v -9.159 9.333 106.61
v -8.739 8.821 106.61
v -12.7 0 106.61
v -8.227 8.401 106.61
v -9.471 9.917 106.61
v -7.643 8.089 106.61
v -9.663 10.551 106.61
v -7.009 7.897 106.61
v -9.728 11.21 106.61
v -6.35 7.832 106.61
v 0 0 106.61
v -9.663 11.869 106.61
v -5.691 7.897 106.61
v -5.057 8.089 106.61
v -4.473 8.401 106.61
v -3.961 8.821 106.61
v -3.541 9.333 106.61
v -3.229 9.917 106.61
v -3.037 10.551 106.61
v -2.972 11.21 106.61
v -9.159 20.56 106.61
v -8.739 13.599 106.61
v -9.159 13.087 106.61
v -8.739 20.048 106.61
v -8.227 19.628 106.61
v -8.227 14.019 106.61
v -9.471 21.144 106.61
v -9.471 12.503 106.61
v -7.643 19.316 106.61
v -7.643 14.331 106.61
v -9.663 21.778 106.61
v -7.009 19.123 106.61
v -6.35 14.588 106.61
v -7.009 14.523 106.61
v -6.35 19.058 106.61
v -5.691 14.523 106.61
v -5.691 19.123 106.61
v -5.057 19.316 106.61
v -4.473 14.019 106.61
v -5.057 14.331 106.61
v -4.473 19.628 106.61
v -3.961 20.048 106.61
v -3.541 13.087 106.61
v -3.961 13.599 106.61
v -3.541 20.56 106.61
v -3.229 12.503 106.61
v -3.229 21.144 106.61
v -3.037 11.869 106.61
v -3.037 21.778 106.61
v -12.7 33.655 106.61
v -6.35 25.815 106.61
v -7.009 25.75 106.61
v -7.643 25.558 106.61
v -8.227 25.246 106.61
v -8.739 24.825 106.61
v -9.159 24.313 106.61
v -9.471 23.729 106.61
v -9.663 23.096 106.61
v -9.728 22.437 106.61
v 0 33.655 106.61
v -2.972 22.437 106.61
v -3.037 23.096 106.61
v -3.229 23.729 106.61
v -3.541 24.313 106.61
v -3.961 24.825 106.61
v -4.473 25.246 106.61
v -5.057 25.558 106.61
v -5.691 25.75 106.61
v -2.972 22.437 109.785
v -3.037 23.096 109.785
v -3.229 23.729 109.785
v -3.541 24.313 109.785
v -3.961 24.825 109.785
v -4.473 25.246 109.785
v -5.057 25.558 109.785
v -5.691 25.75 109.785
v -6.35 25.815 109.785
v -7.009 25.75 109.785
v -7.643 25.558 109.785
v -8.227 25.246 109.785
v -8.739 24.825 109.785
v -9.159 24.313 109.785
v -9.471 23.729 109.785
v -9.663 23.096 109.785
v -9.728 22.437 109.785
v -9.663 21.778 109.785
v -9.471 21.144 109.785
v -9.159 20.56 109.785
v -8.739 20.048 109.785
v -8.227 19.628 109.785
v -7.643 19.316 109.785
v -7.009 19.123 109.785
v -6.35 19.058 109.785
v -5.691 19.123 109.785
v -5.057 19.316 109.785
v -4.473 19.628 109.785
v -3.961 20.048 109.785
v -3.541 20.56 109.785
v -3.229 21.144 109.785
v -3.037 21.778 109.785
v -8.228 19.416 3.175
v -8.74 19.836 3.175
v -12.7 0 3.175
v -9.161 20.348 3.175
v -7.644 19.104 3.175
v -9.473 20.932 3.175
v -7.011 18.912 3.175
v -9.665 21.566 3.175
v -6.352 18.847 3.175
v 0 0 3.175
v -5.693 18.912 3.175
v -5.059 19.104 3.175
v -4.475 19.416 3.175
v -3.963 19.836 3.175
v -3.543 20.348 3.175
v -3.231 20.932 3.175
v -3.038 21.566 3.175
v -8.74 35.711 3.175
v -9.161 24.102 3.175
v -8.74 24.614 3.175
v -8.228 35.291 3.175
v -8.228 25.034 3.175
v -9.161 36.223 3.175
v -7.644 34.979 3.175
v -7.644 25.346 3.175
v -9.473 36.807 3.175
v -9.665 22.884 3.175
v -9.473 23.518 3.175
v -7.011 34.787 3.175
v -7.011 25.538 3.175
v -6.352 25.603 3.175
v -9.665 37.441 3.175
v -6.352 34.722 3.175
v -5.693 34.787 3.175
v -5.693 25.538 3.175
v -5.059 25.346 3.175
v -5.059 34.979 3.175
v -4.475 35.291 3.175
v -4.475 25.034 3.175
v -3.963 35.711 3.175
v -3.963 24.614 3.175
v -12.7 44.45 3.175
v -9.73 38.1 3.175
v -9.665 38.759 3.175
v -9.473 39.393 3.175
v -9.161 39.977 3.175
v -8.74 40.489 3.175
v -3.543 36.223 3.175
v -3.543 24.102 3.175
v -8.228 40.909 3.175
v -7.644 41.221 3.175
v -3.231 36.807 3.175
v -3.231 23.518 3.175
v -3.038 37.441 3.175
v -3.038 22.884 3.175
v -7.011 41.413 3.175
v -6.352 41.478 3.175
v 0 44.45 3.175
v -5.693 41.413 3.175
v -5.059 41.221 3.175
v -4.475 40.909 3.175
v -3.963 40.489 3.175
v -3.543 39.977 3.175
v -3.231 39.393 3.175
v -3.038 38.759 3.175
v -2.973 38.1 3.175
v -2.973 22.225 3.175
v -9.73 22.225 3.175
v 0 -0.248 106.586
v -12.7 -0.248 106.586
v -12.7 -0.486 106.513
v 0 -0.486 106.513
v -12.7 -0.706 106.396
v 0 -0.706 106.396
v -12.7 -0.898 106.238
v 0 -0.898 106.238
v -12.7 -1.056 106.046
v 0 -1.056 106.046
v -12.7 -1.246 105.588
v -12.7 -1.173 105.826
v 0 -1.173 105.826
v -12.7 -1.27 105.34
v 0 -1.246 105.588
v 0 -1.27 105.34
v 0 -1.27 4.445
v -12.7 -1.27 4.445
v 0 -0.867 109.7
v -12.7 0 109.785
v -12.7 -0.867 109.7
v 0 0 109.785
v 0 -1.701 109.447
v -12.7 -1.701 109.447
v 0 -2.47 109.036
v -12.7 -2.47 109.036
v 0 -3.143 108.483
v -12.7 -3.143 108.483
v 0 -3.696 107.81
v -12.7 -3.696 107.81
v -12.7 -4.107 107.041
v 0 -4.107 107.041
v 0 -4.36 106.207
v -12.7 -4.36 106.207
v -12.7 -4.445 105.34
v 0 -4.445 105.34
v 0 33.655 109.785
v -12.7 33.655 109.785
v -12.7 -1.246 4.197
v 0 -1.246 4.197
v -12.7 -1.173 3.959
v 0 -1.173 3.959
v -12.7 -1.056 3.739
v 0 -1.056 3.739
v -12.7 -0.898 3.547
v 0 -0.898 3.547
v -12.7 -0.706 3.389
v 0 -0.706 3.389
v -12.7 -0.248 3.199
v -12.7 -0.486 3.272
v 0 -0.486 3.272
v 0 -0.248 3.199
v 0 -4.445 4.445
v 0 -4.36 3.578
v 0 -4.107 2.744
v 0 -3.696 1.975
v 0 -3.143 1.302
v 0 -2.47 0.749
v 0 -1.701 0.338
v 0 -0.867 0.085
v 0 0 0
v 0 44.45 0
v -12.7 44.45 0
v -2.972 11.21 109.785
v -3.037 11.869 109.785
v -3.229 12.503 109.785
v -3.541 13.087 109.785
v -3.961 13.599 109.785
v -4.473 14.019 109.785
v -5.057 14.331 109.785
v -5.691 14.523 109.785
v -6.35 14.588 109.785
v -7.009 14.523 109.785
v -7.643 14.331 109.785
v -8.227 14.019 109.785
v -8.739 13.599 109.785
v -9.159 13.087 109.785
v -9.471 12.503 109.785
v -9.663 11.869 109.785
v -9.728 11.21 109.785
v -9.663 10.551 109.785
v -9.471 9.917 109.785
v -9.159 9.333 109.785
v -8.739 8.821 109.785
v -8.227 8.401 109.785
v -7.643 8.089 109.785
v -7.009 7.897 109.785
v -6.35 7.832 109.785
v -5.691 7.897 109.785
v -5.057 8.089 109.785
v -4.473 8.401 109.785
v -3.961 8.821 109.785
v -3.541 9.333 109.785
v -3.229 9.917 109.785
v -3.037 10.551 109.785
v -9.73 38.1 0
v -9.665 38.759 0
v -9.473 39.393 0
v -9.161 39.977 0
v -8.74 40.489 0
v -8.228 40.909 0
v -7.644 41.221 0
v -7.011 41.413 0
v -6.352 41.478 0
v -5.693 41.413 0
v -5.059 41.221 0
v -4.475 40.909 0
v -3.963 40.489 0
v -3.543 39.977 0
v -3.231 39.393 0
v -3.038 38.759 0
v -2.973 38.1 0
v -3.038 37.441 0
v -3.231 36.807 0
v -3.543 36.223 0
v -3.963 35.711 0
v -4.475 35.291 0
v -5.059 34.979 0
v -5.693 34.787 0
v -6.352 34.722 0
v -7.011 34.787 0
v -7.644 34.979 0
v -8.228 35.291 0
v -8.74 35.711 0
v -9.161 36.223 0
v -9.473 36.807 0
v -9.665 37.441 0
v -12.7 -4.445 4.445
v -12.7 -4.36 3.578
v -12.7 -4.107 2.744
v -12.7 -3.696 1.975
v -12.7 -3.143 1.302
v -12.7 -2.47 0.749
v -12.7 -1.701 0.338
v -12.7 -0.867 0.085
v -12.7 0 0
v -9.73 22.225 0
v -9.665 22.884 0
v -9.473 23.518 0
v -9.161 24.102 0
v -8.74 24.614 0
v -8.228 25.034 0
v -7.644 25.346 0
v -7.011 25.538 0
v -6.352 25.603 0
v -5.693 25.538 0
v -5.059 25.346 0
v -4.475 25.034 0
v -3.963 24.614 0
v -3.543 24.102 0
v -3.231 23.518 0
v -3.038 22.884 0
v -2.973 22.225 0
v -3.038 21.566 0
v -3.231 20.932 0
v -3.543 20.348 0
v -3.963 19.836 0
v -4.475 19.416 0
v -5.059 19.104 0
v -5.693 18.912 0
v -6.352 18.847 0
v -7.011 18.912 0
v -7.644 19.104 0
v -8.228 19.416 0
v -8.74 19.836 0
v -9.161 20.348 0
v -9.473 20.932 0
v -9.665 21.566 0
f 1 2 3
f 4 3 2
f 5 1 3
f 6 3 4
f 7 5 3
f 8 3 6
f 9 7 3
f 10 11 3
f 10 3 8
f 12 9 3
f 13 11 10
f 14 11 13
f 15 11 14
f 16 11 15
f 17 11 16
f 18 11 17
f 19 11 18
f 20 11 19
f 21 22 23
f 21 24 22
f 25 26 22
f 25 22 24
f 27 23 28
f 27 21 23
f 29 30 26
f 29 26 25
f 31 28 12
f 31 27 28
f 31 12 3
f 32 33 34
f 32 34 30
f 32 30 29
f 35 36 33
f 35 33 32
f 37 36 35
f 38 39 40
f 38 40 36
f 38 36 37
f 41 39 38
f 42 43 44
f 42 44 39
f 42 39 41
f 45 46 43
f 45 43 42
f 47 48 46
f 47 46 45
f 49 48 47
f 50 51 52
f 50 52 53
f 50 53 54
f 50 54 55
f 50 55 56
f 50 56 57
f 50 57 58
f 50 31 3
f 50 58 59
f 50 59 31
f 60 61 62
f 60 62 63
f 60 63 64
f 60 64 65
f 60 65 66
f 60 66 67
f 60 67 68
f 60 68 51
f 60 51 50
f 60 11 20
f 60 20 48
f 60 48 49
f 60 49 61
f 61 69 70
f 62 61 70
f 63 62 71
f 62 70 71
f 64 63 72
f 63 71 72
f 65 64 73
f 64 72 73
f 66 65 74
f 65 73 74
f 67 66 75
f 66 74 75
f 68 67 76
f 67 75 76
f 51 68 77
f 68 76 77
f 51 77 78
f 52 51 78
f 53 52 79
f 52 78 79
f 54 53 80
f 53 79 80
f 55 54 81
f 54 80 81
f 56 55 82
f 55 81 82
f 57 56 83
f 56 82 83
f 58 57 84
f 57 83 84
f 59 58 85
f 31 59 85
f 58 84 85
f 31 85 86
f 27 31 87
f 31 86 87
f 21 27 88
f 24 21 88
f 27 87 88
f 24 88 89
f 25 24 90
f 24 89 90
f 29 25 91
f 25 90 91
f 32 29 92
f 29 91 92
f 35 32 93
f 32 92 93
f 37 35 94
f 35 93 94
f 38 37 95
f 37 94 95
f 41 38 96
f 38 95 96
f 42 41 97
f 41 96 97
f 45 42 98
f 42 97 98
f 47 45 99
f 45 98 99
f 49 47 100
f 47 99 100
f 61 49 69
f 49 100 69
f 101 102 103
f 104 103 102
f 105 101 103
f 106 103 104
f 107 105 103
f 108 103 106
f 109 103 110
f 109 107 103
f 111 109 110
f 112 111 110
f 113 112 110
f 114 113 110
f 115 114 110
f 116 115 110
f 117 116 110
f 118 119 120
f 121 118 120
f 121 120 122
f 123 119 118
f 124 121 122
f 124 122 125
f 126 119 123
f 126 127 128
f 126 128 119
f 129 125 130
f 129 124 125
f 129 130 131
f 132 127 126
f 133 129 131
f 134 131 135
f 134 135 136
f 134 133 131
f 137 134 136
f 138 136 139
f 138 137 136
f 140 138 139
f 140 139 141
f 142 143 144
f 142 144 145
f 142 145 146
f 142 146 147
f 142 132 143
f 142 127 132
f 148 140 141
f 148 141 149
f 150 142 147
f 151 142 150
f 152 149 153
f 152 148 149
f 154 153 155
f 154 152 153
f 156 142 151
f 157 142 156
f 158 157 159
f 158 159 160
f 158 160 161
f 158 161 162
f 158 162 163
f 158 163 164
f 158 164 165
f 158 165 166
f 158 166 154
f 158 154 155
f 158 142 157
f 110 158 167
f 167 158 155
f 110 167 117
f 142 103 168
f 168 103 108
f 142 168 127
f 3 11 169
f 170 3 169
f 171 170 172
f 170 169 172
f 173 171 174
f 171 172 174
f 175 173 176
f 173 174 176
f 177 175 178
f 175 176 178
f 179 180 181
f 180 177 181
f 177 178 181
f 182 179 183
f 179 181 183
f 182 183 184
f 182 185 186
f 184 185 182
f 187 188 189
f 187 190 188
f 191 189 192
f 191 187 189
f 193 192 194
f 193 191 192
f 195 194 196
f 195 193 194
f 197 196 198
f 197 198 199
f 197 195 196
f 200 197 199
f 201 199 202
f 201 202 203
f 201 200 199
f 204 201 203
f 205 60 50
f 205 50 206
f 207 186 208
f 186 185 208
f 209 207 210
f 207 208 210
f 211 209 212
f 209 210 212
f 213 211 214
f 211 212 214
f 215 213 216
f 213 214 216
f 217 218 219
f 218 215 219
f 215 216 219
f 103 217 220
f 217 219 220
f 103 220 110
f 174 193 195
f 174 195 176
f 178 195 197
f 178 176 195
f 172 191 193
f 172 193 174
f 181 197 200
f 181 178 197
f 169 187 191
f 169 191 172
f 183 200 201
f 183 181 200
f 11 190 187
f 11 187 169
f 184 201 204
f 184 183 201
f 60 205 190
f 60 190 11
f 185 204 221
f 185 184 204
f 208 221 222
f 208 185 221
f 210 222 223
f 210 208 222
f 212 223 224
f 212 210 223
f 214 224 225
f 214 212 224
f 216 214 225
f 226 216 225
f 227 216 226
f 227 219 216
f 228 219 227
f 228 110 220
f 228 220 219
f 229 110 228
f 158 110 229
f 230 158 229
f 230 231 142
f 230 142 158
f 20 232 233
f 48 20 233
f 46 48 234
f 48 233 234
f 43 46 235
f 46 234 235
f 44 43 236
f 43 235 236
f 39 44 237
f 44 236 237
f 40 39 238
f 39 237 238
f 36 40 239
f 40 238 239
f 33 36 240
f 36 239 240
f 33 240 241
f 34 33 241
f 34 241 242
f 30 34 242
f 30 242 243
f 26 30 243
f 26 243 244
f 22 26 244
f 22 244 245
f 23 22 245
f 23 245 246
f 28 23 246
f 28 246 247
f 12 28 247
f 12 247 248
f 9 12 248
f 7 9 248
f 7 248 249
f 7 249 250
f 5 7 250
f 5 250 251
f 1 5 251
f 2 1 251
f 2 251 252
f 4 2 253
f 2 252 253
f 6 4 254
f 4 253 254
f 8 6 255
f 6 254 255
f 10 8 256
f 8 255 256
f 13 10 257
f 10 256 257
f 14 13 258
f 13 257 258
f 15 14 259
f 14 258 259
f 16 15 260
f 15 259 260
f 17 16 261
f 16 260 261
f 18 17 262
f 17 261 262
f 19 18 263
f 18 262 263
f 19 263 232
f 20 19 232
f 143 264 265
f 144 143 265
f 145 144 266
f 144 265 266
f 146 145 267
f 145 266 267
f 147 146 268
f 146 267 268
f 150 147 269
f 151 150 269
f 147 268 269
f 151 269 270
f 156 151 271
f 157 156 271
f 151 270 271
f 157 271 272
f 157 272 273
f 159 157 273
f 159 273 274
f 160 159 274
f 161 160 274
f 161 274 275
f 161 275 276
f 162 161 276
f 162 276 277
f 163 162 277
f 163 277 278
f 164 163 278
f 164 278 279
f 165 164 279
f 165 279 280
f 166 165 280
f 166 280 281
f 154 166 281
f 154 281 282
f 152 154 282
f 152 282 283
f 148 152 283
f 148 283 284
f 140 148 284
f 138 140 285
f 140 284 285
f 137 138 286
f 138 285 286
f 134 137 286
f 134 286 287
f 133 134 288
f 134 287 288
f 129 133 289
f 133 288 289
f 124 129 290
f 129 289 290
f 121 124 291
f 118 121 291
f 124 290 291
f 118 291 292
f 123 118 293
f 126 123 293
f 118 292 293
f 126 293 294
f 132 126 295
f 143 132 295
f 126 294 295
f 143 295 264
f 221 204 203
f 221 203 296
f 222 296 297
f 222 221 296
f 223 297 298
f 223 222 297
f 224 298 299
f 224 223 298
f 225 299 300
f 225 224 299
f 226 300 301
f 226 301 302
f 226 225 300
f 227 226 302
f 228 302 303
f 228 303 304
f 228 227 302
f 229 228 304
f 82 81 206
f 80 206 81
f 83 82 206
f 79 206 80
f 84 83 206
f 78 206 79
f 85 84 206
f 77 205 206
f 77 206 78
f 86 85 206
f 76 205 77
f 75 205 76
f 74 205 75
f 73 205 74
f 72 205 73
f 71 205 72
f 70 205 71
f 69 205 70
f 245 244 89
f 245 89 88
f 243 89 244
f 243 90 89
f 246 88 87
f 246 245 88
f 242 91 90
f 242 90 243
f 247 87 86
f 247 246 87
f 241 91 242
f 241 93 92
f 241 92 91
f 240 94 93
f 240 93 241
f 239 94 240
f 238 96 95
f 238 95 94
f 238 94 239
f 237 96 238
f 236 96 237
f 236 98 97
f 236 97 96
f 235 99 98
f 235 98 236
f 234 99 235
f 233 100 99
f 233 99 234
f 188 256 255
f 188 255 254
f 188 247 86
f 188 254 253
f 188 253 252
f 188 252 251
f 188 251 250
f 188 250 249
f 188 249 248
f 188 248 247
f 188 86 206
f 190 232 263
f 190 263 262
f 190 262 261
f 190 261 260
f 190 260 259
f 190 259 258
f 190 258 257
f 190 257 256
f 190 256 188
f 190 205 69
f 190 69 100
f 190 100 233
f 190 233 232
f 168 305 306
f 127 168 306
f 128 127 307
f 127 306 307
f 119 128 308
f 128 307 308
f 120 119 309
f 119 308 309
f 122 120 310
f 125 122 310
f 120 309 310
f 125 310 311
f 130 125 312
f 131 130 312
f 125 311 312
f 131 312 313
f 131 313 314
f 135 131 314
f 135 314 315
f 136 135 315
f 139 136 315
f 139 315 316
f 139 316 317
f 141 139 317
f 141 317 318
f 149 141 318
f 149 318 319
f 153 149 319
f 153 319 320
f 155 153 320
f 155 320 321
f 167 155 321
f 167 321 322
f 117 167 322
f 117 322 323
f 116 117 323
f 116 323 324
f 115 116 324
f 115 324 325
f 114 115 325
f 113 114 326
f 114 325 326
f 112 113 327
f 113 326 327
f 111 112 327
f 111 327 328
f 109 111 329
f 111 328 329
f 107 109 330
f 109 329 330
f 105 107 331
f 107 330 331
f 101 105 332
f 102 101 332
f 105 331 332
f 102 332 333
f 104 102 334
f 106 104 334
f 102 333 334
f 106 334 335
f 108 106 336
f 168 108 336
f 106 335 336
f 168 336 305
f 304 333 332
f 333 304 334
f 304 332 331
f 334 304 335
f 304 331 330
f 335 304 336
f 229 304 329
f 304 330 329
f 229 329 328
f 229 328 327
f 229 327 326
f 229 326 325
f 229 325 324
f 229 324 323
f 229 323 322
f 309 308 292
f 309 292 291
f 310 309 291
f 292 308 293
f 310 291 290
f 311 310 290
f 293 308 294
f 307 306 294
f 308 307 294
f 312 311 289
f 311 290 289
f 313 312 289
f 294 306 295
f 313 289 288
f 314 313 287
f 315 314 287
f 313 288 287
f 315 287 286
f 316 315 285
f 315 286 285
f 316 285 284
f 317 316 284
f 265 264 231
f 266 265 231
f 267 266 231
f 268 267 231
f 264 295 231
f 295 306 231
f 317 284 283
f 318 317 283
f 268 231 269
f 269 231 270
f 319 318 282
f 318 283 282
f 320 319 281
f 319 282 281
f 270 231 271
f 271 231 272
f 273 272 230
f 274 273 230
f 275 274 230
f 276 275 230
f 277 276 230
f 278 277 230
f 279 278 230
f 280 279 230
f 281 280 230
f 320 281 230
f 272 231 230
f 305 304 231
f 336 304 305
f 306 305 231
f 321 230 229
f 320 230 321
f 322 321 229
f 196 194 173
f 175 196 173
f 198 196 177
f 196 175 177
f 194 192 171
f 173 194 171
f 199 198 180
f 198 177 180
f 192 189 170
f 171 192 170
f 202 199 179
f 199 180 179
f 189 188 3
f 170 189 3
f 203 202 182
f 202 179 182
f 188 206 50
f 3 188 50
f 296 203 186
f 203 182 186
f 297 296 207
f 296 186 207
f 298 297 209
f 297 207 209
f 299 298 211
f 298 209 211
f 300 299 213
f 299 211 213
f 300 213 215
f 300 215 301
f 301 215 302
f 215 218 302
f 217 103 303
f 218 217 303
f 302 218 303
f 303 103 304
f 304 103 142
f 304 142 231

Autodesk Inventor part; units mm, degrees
ref_plane "YZ Plane" through (0, 0, 0) normal (1, 0, 0) x (0, 1, 0)
ref_plane "XZ Plane" through (0, 0, 0) normal (0, 1, 0) x (-1, 0, 0)
ref_plane "XY Plane" through (0, 0, 0) normal (0, 0, 1) x (1, 0, 0)
sketch "Sketch1" plane through (0, 0, 0) normal (0, 0, 1) x (1, 0, 0)
  line L0 (0, 0) -> (187.378778, 0)
  line L1 (187.378778, -12.7) -> (0, -12.7)
  line L2 (0, 0) -> (35.7378, 0)
  line L3 (35.7378, 0) -> (35.7378, -1.5875)
  line L4 (35.7378, -1.5875) -> (36.53155, -1.5875)
  line L5 (36.53155, -1.5875) -> (36.53155, 0)
  line L6 (35.7378, -1.5875) -> (34.94405, -1.5875)
  line L7 (34.94405, -1.5875) -> (34.94405, 0)
  line L8 (36.53155, -12.7) -> (34.94405, -12.7)
  line L9 (34.94405, -12.7) -> (34.94405, -11.1125)
  line L10 (34.94405, -11.1125) -> (36.53155, -11.1125)
  line L11 (36.53155, -11.1125) -> (36.53155, -12.7)
  line L12 (187.378778, 0) -> (151.640978, 0)
sketch "Sketch3" plane through (0, 0, 0) normal (0, 0, -1) x (-1, 0, 0)
  circle A0 centre (6.35164, 38.1) radius 3.3782
  circle A1 centre (6.35164, 22.225) radius 3.3782
sketch "Sketch6" plane through (-12.7, 33.655, 109.78515) normal (0, 0, 1) x (1, 0, 0)
  line L0 (0, 0) -> (12.7, 0)
  line L1 (0, -33.655) -> (0, 0)
  line L2 (6.35, 0) -> (6.35, -11.218333)
  line L3 (6.35, -11.218333) -> (6.35, -22.445133)
  circle A0 centre (6.35, -11.218333) radius 3.3782
  circle A1 centre (6.35, -22.445133) radius 3.3782
  dimension "d29" = 11.21833
  dimension "d31" = 11.2268
  dimension "d32" = 6.7564
  dimension "d33" = 6.7564
sketch "Sketch1 outline for Plate1" plane through (0, 0, 0) normal (0, 0, 1) x (1, 0, 0)
  line L0 (0, 0) -> (-12.7, 0)
  line L1 (-12.7, 0) -> (-12.7, 44.45)
  line L2 (-12.7, 44.45) -> (0, 44.45)
  line L3 (0, 44.45) -> (0, 0)
extrude "Plate1" add sketch "Sketch1 outline for Plate1" along normal blind 3.175
sketch "Sketch2" plane through (0, -12.7, 0) normal (0, 0, 1) x (1, 0, 0)
  line L0 (35.7378, 11.1125) -> (35.7378, 12.7)
  line L1 (0, 12.7) -> (35.7378, 12.7)
  line L2 (36.53155, 12.7) -> (187.378778, 12.7)
  line L3 (35.7378, 11.1125) -> (34.94405, 11.1125)
  line L4 (34.94405, 11.1125) -> (34.94405, 12.7)
edge flange "Flange1" height 105.34015 angle 90 thickness 3.175 bend radius 1.27 thickness toward (0, -1, 0) relief straight relief width 3.175 relief depth 1.5875 edges at (-6.35, 0, 3.175) wall of the first edge with corners at (-12.7, -1.27, 4.445) (0, -1.27, 4.445) (0, -1.27, 105.34015) (-12.7, -1.27, 105.34015)
bend "Bend1"
corner "Corner1"
sketch "Sketch4" plane through (0, -12.7, 0) normal (0, 0, 1) x (1, 0, 0)
  line L0 (187.378778, 0) -> (36.53155, 0)
  line L1 (36.53155, 12.7) -> (187.378778, 12.7)
  line L2 (187.378778, 12.7) -> (140.845978, 12.7)
  line L3 (140.845978, 12.7) -> (140.845978, 11.1125)
  line L4 (140.845978, 11.1125) -> (141.639728, 11.1125)
  line L5 (141.639728, 11.1125) -> (141.639728, 12.7)
  line L6 (140.845978, 11.1125) -> (140.052228, 11.1125)
  line L7 (140.052228, 11.1125) -> (140.052228, 12.7)
  line L8 (140.845978, 0) -> (141.639728, 0)
  line L9 (141.639728, 0) -> (141.639728, 1.5875)
  line L10 (141.639728, 1.5875) -> (140.052228, 1.5875)
  line L11 (140.052228, 1.5875) -> (140.052228, 0)
  dimension "d15" = 1.5875
extrude "Cut1" cut sketch "Sketch3" against normal blind 3.175
sketch "Sketch5" plane through (0, -12.7, 0) normal (0, 0, 1) x (1, 0, 0)
  line L0 (140.845978, 12.7) -> (140.845978, 11.1125)
  line L1 (140.845978, 12.7) -> (187.378778, 12.7)
  line L2 (140.845978, 11.1125) -> (141.639728, 11.1125)
  line L3 (141.639728, 11.1125) -> (141.639728, 12.7)
edge flange "Flange2" height 38.1 angle 90 thickness 3.175 bend radius 1.27 thickness toward (0, 0, 1) relief straight relief width 3.175 relief depth 1.5875 edges at (-6.35, -1.27, 105.34015) wall of the first edge with corners at (-12.7, 0, 106.61015) (0, 0, 106.61015) (0, 33.655, 106.61015) (-12.7, 33.655, 106.61015)
bend "Bend2"
corner "Corner2"
extrude "Cut3" cut sketch "Sketch6" against normal blind 3.175
equation "\"d3\" = BendReliefWidth"
equation "\"d4\" = BendReliefDepth"
equation "\"d5\" = MinimumRemnant"
equation "\"d6\" = BendRadius"
equation "\"d10\" = CornerReliefSize"
equation "\"d11\" = GapSize"
equation "\"d12\" = JacobiRadiusSize"
equation "\"d19\" = BendReliefWidth"
equation "\"d20\" = BendReliefDepth"
equation "\"d21\" = MinimumRemnant"
equation "\"d22\" = BendRadius"
equation "\"d26\" = CornerReliefSize"
equation "\"d27\" = GapSize"
equation "\"d28\" = JacobiRadiusSize"
equation "\"BendRadius\" = Thickness"
equation "\"BendReliefWidth\" = Thickness"
equation "\"BendReliefDepth\" = 0.5 * Thickness"
equation "\"CornerReliefSize\" = 4 * Thickness"
equation "\"MinimumRemnant\" = 2 * Thickness"
equation "\"TransitionRadius\" = BendRadius"
equation "\"JacobiRadiusSize\" = Thickness"
equation "\"GapSize\" = Thickness"
equation "\"d2\" = BendRadius"
equation "\"d6\" = Thickness"
equation "\"d16\" = Thickness"
equation "\"Thickness\" = 3.175"
properties part number "bottom pulley mount"
